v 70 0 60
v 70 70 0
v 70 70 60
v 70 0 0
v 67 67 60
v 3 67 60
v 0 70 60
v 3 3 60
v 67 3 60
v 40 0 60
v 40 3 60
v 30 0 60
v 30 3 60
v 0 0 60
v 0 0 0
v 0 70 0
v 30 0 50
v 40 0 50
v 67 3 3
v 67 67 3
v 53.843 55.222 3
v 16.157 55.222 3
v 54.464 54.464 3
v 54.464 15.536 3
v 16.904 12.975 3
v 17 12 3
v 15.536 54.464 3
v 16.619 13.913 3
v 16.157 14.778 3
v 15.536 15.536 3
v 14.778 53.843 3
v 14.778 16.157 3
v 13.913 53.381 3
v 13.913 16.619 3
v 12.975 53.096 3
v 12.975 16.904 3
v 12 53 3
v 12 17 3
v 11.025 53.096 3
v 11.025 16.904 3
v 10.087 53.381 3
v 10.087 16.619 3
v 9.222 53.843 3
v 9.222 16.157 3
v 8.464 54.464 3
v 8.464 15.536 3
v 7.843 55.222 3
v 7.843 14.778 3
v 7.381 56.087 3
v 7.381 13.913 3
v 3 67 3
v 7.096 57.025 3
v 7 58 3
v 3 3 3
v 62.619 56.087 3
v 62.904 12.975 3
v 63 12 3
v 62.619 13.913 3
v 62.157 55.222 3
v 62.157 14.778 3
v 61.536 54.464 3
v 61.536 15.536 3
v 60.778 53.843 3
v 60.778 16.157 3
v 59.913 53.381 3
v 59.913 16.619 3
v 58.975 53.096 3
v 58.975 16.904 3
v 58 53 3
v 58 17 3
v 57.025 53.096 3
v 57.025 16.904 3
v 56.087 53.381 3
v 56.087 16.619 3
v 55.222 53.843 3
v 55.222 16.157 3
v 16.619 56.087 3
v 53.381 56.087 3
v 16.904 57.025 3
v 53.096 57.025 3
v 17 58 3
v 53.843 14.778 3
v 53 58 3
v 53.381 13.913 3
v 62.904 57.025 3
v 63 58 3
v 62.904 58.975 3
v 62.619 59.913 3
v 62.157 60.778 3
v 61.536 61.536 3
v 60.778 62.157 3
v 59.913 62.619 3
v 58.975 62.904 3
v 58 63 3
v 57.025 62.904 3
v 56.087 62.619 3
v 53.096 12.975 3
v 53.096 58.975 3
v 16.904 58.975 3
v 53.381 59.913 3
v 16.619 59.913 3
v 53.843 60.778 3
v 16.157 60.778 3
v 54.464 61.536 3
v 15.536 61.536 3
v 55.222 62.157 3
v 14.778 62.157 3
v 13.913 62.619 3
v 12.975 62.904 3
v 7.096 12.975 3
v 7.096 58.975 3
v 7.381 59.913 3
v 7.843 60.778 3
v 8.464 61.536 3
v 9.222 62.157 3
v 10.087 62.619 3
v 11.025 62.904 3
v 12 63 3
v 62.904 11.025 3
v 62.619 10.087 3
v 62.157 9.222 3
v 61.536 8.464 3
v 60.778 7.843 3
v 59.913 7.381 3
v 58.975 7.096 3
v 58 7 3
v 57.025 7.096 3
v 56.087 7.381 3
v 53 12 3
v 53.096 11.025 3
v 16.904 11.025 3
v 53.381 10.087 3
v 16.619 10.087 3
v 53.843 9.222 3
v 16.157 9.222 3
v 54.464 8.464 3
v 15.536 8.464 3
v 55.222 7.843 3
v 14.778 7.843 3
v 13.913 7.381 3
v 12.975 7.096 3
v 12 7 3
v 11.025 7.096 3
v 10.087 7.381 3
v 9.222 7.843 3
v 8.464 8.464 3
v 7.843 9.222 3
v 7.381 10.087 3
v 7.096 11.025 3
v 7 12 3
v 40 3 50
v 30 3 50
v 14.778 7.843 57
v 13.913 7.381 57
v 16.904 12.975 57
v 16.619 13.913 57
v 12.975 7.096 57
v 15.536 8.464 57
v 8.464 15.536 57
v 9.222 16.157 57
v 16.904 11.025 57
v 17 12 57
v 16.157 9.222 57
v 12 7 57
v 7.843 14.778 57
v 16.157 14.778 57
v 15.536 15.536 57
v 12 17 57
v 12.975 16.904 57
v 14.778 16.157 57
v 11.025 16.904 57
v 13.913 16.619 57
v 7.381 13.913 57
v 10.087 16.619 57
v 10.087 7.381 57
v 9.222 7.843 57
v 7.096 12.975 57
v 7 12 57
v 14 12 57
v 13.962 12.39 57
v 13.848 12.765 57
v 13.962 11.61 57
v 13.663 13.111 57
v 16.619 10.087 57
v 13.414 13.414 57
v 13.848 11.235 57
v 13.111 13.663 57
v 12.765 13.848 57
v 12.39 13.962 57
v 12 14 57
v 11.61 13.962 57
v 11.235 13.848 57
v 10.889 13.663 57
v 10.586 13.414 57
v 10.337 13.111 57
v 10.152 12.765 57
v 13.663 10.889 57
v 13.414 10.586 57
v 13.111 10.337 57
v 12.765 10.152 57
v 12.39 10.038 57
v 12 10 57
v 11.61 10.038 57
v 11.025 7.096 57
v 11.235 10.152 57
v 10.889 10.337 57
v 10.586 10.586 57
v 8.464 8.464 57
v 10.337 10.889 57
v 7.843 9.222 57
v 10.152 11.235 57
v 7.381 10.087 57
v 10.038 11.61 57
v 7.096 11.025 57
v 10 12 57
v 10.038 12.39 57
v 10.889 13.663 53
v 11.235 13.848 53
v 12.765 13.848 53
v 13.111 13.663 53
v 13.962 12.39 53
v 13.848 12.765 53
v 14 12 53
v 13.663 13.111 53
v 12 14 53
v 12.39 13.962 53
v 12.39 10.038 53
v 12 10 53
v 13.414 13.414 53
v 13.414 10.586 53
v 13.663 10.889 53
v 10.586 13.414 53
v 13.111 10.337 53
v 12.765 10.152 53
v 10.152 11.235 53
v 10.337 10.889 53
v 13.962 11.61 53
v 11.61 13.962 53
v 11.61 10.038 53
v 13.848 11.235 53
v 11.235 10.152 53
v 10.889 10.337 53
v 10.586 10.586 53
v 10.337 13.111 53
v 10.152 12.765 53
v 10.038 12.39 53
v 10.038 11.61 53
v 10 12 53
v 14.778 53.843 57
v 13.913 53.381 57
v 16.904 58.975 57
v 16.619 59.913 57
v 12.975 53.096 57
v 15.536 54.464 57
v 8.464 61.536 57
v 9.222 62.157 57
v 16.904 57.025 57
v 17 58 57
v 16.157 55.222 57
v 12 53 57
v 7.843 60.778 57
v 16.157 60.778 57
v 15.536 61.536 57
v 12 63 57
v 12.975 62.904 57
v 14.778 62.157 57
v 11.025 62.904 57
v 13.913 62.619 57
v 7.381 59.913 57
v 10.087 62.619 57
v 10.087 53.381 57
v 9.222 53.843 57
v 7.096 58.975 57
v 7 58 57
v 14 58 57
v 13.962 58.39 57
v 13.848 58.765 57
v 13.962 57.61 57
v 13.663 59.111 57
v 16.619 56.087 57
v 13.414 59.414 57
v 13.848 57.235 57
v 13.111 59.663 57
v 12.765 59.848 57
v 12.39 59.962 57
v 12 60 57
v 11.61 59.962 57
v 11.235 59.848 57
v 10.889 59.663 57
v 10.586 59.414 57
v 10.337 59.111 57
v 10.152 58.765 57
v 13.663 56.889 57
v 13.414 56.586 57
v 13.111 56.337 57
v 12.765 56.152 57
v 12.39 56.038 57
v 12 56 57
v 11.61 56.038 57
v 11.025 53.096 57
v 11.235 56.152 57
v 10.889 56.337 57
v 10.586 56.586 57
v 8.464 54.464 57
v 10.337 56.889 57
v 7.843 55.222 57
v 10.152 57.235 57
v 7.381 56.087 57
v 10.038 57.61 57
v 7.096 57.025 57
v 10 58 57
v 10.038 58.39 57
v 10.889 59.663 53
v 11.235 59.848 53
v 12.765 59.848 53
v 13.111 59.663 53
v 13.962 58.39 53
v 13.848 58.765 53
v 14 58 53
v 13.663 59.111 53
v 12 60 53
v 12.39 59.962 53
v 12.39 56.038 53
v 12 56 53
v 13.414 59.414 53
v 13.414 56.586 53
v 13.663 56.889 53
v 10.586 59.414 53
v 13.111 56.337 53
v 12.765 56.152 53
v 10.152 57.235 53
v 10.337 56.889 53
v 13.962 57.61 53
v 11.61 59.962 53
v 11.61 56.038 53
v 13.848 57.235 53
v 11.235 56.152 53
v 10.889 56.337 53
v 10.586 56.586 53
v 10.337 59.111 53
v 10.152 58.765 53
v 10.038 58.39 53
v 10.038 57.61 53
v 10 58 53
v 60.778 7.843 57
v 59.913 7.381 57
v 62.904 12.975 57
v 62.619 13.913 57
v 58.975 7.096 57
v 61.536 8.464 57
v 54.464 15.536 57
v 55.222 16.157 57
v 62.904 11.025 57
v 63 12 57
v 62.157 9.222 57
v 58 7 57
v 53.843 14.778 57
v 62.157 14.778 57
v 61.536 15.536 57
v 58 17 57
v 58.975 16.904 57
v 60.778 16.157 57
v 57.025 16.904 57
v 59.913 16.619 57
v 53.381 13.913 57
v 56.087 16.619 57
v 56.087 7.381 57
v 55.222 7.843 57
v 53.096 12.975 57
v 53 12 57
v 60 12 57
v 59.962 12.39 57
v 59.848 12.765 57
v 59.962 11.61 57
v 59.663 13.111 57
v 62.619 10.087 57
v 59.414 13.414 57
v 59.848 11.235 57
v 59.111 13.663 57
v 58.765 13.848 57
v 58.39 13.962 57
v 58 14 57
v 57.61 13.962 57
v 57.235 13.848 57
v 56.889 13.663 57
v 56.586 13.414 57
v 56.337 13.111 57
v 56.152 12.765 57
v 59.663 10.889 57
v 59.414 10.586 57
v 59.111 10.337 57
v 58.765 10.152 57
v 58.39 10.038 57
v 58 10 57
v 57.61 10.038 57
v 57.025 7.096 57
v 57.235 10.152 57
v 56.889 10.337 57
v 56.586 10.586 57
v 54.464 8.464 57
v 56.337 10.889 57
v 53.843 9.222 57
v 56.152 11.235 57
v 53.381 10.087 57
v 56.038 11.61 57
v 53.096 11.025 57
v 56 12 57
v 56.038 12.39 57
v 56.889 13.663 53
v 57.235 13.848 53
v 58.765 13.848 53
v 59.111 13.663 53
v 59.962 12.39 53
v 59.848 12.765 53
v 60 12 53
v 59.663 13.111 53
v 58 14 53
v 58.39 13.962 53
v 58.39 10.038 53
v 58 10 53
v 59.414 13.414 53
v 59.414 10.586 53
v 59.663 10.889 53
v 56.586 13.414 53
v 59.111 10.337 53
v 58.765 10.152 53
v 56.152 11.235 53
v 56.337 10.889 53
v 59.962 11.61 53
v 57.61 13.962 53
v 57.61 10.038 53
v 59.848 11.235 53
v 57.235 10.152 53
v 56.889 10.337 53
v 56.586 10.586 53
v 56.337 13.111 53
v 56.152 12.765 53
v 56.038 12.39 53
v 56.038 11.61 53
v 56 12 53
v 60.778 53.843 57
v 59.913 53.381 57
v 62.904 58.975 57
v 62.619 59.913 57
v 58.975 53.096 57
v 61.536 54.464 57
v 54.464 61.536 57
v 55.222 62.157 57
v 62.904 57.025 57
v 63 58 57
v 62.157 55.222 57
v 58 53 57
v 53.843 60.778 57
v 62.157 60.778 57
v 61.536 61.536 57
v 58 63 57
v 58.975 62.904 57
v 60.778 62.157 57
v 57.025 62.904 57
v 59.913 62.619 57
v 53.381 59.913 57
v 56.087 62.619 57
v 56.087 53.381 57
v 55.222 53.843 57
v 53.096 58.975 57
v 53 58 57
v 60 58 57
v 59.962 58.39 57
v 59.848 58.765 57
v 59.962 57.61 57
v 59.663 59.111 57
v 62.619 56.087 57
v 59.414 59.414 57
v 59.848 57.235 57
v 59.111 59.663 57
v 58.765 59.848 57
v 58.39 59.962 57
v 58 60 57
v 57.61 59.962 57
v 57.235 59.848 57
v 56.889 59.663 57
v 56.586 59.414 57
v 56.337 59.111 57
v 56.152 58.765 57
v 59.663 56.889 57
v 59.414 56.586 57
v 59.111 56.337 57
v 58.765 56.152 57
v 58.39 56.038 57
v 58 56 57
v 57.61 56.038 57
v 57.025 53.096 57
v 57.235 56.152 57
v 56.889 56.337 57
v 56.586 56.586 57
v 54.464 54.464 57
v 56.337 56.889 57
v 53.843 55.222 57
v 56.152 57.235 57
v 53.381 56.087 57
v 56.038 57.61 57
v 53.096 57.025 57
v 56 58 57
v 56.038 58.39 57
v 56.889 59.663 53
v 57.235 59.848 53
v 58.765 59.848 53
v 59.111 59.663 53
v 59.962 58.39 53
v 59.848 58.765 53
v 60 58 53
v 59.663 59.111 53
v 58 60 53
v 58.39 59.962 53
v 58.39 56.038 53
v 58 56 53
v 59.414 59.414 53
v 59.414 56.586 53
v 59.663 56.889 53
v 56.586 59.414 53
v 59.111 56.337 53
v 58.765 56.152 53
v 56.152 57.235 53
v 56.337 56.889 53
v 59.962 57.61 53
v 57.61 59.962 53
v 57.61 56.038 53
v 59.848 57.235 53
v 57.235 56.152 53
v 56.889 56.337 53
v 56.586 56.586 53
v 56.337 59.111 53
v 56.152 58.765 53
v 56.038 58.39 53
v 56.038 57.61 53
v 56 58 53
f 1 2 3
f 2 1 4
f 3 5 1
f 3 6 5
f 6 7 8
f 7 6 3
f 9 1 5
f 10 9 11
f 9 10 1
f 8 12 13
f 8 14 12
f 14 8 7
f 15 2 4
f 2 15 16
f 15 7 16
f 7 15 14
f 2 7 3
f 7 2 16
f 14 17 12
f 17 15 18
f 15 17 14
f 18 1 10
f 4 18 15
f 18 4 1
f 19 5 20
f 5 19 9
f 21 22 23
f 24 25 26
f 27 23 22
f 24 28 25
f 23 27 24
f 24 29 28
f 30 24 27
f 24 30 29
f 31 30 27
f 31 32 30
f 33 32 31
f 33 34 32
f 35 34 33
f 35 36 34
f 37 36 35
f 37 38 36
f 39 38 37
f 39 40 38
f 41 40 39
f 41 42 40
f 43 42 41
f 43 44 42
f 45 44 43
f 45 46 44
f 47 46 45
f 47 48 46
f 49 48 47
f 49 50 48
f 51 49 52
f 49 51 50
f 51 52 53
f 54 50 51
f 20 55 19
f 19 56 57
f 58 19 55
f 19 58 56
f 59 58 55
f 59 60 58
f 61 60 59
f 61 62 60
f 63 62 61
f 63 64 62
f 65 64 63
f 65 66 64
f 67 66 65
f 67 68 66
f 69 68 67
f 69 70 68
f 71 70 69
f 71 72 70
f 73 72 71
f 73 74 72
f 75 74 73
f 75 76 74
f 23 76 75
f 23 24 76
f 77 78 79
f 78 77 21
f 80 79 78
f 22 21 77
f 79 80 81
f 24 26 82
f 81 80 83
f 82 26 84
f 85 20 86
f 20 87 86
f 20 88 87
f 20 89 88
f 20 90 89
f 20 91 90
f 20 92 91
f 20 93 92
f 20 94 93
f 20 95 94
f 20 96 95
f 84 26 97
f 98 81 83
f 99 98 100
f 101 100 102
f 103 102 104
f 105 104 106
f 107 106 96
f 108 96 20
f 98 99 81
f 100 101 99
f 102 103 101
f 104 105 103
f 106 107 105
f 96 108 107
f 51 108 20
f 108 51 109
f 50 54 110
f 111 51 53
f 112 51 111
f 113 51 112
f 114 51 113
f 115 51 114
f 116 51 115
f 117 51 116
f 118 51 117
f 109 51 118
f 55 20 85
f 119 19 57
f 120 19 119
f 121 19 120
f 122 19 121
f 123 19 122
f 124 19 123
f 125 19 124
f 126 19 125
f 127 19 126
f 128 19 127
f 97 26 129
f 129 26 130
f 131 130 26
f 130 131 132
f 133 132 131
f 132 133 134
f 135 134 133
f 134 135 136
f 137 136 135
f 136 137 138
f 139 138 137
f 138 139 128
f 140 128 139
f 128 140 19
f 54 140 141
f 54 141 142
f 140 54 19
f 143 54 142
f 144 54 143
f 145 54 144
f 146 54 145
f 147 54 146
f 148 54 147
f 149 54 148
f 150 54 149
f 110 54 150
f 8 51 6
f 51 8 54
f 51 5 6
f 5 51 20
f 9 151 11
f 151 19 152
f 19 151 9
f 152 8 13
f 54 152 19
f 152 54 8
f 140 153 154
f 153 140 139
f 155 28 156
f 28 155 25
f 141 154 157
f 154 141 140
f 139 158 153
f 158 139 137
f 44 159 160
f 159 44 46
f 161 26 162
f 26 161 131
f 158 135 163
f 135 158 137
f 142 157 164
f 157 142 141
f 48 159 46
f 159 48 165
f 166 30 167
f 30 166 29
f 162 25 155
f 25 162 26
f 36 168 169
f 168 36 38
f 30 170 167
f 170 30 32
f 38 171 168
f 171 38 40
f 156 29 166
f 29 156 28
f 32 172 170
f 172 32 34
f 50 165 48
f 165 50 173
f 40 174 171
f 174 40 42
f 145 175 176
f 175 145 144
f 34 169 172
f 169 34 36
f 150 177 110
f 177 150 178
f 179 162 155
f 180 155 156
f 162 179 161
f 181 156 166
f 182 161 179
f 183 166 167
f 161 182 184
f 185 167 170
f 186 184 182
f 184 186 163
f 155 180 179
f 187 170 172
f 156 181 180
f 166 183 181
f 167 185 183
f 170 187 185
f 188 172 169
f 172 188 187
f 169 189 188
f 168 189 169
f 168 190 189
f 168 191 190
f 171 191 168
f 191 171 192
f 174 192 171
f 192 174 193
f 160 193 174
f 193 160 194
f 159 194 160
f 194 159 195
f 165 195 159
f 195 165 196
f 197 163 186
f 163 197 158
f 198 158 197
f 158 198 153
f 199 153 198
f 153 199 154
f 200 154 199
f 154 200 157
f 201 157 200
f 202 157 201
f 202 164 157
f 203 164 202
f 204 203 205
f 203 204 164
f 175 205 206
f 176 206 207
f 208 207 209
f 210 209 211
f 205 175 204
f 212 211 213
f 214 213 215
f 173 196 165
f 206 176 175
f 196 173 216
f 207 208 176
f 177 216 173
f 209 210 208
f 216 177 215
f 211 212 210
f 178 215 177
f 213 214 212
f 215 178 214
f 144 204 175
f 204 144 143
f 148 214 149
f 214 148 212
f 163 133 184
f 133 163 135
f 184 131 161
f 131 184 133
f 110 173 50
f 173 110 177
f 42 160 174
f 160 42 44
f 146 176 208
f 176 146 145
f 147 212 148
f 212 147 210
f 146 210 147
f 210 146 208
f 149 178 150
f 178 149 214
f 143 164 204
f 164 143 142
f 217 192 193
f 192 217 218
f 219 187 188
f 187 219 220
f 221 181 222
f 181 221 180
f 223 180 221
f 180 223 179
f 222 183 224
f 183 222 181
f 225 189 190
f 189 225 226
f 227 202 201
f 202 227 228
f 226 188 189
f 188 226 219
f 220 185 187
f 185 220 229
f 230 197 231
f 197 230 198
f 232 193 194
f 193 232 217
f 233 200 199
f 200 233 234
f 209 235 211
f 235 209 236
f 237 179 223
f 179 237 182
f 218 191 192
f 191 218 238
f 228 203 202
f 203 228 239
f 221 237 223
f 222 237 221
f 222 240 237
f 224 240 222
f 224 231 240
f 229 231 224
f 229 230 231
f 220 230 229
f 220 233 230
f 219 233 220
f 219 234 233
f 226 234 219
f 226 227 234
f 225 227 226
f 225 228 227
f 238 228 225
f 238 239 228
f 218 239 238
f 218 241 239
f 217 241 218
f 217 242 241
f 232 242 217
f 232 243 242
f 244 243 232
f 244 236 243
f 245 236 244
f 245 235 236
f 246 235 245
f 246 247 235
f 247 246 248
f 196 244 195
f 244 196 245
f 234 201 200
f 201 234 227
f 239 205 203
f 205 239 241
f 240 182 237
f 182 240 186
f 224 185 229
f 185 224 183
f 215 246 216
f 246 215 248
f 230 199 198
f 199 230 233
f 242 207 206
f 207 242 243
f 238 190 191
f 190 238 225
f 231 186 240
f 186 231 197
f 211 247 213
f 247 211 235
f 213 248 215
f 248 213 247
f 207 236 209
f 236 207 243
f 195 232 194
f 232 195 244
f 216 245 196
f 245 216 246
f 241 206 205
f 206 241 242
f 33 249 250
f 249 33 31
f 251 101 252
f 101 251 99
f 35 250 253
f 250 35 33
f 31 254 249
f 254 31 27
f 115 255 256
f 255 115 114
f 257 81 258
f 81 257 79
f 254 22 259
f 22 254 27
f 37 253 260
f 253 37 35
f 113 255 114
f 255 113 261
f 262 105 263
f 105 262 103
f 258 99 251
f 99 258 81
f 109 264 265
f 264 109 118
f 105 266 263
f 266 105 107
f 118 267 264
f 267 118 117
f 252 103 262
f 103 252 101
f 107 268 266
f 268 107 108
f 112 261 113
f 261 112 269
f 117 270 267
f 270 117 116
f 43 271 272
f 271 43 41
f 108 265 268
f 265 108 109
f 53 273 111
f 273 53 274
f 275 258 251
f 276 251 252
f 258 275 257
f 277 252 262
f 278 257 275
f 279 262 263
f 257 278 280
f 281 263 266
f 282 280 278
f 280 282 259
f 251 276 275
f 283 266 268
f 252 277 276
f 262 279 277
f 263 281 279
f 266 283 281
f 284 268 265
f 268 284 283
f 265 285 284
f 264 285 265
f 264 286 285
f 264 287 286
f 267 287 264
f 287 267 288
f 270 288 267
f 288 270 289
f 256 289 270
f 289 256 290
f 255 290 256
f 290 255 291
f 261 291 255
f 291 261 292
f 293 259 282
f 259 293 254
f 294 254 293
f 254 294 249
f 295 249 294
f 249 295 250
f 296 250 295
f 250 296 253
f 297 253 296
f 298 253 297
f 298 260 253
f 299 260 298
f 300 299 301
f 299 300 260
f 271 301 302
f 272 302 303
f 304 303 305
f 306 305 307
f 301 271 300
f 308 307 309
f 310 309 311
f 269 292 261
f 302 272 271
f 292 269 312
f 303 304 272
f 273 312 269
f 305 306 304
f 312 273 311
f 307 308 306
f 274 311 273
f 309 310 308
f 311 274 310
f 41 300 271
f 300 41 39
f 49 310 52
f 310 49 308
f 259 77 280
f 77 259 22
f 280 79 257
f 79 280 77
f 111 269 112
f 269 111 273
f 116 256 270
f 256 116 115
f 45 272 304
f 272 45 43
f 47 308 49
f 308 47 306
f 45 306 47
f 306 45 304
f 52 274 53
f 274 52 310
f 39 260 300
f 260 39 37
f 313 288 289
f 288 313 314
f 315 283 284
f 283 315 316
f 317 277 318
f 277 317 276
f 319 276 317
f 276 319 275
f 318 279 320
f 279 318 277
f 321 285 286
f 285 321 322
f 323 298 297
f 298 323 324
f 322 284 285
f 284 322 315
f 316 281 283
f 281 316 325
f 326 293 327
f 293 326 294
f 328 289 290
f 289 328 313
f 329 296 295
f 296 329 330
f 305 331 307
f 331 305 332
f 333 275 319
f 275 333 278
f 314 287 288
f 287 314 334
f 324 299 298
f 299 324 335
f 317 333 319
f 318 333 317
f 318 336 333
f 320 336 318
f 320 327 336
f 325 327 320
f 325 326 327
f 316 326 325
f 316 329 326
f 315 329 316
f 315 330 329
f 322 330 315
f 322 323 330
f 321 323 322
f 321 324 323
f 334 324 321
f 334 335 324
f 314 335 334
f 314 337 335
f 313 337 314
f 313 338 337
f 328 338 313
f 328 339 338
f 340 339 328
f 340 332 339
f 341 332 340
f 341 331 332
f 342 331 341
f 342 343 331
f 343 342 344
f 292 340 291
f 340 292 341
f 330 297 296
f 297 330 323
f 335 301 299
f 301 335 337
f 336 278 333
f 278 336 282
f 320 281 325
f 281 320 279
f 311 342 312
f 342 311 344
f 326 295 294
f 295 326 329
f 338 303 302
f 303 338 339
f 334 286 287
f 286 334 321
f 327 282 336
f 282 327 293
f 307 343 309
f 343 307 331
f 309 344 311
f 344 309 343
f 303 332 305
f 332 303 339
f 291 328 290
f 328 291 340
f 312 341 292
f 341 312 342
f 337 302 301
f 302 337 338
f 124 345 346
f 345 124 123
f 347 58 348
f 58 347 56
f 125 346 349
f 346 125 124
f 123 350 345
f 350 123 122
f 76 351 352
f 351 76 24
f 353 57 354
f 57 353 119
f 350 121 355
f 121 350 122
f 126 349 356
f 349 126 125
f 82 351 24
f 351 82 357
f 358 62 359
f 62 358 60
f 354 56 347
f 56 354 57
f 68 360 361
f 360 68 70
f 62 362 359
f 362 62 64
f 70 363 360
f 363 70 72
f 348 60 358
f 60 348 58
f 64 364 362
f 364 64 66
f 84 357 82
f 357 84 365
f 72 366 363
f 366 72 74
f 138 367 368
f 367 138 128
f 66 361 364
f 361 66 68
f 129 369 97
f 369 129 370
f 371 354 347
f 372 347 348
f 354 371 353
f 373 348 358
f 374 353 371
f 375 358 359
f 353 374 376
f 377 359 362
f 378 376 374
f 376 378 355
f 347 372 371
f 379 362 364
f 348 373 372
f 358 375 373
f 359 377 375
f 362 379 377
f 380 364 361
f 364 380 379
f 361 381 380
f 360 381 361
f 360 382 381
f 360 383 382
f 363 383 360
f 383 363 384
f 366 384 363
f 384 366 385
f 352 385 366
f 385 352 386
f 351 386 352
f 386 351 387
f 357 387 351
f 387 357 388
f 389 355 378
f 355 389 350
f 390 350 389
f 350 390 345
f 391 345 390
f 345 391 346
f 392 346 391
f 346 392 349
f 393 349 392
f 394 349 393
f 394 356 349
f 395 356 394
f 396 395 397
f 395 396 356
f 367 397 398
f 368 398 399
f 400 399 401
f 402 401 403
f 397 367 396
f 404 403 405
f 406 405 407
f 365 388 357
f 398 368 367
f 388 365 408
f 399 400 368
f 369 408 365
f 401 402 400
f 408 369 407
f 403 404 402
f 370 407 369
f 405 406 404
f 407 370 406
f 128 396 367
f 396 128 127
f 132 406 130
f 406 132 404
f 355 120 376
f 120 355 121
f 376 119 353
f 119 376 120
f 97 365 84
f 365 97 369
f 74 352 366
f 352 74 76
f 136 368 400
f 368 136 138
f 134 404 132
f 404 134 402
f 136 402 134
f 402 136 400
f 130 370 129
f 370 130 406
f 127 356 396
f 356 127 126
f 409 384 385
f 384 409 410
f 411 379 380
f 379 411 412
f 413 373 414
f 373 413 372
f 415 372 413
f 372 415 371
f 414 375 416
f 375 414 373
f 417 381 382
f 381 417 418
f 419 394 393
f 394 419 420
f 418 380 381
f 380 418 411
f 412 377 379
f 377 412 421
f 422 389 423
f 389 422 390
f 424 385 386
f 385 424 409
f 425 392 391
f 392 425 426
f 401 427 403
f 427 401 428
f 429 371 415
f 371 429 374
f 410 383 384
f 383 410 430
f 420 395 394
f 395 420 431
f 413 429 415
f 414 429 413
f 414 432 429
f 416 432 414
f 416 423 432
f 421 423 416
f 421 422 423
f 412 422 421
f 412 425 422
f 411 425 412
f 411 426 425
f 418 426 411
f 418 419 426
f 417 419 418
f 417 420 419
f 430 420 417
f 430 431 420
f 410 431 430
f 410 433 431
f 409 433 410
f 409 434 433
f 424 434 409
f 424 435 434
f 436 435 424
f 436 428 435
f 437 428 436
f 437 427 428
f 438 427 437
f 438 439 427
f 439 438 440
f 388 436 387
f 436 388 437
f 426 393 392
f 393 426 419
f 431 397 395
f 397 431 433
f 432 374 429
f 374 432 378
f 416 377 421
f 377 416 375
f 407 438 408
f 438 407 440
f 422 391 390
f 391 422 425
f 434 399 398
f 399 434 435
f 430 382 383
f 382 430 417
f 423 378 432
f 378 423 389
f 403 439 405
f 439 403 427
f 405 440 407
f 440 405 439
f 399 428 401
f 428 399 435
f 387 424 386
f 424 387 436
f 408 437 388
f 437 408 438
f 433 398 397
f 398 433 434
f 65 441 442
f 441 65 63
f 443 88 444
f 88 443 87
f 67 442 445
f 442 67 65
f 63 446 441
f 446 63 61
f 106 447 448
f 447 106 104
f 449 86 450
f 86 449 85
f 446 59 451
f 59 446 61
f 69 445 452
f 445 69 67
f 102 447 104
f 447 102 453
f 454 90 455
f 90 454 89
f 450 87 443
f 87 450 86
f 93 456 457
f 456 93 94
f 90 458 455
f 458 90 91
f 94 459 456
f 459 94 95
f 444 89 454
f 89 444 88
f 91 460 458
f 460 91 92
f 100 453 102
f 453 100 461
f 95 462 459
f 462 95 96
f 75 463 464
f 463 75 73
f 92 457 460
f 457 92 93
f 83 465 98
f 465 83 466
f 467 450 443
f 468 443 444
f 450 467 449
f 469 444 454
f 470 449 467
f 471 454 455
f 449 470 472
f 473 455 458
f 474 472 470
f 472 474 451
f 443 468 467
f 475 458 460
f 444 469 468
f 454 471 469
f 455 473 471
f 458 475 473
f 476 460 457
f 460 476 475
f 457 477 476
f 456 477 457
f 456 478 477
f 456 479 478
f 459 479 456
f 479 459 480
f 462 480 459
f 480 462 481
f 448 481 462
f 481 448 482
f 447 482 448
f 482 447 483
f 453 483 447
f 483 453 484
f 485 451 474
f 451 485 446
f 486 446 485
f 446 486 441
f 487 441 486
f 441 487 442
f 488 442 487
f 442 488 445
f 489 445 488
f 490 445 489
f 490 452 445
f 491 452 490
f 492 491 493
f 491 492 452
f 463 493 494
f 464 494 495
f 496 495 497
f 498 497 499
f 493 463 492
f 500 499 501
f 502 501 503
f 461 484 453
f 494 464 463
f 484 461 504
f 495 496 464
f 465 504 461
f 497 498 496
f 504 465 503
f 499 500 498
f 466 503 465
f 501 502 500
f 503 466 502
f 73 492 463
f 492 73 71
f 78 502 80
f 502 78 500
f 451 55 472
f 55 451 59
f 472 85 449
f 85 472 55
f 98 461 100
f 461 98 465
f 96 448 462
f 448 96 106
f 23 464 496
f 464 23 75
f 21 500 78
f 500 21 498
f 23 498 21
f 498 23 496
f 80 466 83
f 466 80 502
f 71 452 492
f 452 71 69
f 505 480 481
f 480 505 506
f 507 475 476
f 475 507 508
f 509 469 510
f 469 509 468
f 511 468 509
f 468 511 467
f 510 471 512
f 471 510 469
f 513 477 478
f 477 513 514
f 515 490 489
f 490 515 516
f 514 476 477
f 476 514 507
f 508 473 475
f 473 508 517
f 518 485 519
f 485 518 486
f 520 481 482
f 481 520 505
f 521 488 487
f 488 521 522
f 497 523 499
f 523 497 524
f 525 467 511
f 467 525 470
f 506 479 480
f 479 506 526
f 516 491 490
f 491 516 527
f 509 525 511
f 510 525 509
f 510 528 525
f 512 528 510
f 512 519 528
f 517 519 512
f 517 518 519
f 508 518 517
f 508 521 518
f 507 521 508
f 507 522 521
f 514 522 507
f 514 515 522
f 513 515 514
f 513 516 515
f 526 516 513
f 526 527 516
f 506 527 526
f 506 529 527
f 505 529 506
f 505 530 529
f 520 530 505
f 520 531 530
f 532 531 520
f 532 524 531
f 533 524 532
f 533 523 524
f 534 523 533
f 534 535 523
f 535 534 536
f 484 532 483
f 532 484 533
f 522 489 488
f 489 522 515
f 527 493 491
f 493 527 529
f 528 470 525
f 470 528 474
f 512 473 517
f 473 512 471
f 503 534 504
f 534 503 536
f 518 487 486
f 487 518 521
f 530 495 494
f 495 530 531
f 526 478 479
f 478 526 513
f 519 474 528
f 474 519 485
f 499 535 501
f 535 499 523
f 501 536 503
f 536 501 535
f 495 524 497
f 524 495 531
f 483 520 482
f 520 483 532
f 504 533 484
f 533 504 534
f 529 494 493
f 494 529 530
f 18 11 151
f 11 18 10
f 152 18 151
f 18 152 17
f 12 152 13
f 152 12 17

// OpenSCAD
$fn = 32;

// ----------------------------------------------------------------------
// Enclosure box: both enclosure
// ----------------------------------------------------------------------

// --- parameters (mm) ---
box_l = 70;               // outer length, X
box_w = 70;               // outer width, Y
box_h = 60;               // outer height
wall_t = 3;               // wall thickness
boss_r = 5;               // corner boss radius
hole_r = 2;               // boss screw hole radius
boss_in = 12;             // boss inset from the corners
notch_w = 10;             // cable notch width
notch_h = 10;             // cable notch height

inner_h = box_h - wall_t;  // cavity depth
boss_h = inner_h - 2;  // corner boss height

difference() {
  union() {
    difference() {
      cube([box_l, box_w, box_h]);
      translate([wall_t, wall_t, wall_t])
        cube([box_l - 2 * wall_t, box_w - 2 * wall_t, box_h]);
    }
    for (sx = [0, 1], sy = [0, 1])
      translate([sx ? box_l - boss_in : boss_in,
                 sy ? box_w - boss_in : boss_in, wall_t - 1])
        difference() {
          cylinder(r = boss_r, h = boss_h);
          translate([0, 0, boss_h - 4])
            cylinder(r = hole_r, h = 5);
        }
  }
  translate([box_l / 2 - notch_w / 2, -1, box_h - notch_h])
    cube([notch_w, wall_t + 2, notch_h + 1]);
}
